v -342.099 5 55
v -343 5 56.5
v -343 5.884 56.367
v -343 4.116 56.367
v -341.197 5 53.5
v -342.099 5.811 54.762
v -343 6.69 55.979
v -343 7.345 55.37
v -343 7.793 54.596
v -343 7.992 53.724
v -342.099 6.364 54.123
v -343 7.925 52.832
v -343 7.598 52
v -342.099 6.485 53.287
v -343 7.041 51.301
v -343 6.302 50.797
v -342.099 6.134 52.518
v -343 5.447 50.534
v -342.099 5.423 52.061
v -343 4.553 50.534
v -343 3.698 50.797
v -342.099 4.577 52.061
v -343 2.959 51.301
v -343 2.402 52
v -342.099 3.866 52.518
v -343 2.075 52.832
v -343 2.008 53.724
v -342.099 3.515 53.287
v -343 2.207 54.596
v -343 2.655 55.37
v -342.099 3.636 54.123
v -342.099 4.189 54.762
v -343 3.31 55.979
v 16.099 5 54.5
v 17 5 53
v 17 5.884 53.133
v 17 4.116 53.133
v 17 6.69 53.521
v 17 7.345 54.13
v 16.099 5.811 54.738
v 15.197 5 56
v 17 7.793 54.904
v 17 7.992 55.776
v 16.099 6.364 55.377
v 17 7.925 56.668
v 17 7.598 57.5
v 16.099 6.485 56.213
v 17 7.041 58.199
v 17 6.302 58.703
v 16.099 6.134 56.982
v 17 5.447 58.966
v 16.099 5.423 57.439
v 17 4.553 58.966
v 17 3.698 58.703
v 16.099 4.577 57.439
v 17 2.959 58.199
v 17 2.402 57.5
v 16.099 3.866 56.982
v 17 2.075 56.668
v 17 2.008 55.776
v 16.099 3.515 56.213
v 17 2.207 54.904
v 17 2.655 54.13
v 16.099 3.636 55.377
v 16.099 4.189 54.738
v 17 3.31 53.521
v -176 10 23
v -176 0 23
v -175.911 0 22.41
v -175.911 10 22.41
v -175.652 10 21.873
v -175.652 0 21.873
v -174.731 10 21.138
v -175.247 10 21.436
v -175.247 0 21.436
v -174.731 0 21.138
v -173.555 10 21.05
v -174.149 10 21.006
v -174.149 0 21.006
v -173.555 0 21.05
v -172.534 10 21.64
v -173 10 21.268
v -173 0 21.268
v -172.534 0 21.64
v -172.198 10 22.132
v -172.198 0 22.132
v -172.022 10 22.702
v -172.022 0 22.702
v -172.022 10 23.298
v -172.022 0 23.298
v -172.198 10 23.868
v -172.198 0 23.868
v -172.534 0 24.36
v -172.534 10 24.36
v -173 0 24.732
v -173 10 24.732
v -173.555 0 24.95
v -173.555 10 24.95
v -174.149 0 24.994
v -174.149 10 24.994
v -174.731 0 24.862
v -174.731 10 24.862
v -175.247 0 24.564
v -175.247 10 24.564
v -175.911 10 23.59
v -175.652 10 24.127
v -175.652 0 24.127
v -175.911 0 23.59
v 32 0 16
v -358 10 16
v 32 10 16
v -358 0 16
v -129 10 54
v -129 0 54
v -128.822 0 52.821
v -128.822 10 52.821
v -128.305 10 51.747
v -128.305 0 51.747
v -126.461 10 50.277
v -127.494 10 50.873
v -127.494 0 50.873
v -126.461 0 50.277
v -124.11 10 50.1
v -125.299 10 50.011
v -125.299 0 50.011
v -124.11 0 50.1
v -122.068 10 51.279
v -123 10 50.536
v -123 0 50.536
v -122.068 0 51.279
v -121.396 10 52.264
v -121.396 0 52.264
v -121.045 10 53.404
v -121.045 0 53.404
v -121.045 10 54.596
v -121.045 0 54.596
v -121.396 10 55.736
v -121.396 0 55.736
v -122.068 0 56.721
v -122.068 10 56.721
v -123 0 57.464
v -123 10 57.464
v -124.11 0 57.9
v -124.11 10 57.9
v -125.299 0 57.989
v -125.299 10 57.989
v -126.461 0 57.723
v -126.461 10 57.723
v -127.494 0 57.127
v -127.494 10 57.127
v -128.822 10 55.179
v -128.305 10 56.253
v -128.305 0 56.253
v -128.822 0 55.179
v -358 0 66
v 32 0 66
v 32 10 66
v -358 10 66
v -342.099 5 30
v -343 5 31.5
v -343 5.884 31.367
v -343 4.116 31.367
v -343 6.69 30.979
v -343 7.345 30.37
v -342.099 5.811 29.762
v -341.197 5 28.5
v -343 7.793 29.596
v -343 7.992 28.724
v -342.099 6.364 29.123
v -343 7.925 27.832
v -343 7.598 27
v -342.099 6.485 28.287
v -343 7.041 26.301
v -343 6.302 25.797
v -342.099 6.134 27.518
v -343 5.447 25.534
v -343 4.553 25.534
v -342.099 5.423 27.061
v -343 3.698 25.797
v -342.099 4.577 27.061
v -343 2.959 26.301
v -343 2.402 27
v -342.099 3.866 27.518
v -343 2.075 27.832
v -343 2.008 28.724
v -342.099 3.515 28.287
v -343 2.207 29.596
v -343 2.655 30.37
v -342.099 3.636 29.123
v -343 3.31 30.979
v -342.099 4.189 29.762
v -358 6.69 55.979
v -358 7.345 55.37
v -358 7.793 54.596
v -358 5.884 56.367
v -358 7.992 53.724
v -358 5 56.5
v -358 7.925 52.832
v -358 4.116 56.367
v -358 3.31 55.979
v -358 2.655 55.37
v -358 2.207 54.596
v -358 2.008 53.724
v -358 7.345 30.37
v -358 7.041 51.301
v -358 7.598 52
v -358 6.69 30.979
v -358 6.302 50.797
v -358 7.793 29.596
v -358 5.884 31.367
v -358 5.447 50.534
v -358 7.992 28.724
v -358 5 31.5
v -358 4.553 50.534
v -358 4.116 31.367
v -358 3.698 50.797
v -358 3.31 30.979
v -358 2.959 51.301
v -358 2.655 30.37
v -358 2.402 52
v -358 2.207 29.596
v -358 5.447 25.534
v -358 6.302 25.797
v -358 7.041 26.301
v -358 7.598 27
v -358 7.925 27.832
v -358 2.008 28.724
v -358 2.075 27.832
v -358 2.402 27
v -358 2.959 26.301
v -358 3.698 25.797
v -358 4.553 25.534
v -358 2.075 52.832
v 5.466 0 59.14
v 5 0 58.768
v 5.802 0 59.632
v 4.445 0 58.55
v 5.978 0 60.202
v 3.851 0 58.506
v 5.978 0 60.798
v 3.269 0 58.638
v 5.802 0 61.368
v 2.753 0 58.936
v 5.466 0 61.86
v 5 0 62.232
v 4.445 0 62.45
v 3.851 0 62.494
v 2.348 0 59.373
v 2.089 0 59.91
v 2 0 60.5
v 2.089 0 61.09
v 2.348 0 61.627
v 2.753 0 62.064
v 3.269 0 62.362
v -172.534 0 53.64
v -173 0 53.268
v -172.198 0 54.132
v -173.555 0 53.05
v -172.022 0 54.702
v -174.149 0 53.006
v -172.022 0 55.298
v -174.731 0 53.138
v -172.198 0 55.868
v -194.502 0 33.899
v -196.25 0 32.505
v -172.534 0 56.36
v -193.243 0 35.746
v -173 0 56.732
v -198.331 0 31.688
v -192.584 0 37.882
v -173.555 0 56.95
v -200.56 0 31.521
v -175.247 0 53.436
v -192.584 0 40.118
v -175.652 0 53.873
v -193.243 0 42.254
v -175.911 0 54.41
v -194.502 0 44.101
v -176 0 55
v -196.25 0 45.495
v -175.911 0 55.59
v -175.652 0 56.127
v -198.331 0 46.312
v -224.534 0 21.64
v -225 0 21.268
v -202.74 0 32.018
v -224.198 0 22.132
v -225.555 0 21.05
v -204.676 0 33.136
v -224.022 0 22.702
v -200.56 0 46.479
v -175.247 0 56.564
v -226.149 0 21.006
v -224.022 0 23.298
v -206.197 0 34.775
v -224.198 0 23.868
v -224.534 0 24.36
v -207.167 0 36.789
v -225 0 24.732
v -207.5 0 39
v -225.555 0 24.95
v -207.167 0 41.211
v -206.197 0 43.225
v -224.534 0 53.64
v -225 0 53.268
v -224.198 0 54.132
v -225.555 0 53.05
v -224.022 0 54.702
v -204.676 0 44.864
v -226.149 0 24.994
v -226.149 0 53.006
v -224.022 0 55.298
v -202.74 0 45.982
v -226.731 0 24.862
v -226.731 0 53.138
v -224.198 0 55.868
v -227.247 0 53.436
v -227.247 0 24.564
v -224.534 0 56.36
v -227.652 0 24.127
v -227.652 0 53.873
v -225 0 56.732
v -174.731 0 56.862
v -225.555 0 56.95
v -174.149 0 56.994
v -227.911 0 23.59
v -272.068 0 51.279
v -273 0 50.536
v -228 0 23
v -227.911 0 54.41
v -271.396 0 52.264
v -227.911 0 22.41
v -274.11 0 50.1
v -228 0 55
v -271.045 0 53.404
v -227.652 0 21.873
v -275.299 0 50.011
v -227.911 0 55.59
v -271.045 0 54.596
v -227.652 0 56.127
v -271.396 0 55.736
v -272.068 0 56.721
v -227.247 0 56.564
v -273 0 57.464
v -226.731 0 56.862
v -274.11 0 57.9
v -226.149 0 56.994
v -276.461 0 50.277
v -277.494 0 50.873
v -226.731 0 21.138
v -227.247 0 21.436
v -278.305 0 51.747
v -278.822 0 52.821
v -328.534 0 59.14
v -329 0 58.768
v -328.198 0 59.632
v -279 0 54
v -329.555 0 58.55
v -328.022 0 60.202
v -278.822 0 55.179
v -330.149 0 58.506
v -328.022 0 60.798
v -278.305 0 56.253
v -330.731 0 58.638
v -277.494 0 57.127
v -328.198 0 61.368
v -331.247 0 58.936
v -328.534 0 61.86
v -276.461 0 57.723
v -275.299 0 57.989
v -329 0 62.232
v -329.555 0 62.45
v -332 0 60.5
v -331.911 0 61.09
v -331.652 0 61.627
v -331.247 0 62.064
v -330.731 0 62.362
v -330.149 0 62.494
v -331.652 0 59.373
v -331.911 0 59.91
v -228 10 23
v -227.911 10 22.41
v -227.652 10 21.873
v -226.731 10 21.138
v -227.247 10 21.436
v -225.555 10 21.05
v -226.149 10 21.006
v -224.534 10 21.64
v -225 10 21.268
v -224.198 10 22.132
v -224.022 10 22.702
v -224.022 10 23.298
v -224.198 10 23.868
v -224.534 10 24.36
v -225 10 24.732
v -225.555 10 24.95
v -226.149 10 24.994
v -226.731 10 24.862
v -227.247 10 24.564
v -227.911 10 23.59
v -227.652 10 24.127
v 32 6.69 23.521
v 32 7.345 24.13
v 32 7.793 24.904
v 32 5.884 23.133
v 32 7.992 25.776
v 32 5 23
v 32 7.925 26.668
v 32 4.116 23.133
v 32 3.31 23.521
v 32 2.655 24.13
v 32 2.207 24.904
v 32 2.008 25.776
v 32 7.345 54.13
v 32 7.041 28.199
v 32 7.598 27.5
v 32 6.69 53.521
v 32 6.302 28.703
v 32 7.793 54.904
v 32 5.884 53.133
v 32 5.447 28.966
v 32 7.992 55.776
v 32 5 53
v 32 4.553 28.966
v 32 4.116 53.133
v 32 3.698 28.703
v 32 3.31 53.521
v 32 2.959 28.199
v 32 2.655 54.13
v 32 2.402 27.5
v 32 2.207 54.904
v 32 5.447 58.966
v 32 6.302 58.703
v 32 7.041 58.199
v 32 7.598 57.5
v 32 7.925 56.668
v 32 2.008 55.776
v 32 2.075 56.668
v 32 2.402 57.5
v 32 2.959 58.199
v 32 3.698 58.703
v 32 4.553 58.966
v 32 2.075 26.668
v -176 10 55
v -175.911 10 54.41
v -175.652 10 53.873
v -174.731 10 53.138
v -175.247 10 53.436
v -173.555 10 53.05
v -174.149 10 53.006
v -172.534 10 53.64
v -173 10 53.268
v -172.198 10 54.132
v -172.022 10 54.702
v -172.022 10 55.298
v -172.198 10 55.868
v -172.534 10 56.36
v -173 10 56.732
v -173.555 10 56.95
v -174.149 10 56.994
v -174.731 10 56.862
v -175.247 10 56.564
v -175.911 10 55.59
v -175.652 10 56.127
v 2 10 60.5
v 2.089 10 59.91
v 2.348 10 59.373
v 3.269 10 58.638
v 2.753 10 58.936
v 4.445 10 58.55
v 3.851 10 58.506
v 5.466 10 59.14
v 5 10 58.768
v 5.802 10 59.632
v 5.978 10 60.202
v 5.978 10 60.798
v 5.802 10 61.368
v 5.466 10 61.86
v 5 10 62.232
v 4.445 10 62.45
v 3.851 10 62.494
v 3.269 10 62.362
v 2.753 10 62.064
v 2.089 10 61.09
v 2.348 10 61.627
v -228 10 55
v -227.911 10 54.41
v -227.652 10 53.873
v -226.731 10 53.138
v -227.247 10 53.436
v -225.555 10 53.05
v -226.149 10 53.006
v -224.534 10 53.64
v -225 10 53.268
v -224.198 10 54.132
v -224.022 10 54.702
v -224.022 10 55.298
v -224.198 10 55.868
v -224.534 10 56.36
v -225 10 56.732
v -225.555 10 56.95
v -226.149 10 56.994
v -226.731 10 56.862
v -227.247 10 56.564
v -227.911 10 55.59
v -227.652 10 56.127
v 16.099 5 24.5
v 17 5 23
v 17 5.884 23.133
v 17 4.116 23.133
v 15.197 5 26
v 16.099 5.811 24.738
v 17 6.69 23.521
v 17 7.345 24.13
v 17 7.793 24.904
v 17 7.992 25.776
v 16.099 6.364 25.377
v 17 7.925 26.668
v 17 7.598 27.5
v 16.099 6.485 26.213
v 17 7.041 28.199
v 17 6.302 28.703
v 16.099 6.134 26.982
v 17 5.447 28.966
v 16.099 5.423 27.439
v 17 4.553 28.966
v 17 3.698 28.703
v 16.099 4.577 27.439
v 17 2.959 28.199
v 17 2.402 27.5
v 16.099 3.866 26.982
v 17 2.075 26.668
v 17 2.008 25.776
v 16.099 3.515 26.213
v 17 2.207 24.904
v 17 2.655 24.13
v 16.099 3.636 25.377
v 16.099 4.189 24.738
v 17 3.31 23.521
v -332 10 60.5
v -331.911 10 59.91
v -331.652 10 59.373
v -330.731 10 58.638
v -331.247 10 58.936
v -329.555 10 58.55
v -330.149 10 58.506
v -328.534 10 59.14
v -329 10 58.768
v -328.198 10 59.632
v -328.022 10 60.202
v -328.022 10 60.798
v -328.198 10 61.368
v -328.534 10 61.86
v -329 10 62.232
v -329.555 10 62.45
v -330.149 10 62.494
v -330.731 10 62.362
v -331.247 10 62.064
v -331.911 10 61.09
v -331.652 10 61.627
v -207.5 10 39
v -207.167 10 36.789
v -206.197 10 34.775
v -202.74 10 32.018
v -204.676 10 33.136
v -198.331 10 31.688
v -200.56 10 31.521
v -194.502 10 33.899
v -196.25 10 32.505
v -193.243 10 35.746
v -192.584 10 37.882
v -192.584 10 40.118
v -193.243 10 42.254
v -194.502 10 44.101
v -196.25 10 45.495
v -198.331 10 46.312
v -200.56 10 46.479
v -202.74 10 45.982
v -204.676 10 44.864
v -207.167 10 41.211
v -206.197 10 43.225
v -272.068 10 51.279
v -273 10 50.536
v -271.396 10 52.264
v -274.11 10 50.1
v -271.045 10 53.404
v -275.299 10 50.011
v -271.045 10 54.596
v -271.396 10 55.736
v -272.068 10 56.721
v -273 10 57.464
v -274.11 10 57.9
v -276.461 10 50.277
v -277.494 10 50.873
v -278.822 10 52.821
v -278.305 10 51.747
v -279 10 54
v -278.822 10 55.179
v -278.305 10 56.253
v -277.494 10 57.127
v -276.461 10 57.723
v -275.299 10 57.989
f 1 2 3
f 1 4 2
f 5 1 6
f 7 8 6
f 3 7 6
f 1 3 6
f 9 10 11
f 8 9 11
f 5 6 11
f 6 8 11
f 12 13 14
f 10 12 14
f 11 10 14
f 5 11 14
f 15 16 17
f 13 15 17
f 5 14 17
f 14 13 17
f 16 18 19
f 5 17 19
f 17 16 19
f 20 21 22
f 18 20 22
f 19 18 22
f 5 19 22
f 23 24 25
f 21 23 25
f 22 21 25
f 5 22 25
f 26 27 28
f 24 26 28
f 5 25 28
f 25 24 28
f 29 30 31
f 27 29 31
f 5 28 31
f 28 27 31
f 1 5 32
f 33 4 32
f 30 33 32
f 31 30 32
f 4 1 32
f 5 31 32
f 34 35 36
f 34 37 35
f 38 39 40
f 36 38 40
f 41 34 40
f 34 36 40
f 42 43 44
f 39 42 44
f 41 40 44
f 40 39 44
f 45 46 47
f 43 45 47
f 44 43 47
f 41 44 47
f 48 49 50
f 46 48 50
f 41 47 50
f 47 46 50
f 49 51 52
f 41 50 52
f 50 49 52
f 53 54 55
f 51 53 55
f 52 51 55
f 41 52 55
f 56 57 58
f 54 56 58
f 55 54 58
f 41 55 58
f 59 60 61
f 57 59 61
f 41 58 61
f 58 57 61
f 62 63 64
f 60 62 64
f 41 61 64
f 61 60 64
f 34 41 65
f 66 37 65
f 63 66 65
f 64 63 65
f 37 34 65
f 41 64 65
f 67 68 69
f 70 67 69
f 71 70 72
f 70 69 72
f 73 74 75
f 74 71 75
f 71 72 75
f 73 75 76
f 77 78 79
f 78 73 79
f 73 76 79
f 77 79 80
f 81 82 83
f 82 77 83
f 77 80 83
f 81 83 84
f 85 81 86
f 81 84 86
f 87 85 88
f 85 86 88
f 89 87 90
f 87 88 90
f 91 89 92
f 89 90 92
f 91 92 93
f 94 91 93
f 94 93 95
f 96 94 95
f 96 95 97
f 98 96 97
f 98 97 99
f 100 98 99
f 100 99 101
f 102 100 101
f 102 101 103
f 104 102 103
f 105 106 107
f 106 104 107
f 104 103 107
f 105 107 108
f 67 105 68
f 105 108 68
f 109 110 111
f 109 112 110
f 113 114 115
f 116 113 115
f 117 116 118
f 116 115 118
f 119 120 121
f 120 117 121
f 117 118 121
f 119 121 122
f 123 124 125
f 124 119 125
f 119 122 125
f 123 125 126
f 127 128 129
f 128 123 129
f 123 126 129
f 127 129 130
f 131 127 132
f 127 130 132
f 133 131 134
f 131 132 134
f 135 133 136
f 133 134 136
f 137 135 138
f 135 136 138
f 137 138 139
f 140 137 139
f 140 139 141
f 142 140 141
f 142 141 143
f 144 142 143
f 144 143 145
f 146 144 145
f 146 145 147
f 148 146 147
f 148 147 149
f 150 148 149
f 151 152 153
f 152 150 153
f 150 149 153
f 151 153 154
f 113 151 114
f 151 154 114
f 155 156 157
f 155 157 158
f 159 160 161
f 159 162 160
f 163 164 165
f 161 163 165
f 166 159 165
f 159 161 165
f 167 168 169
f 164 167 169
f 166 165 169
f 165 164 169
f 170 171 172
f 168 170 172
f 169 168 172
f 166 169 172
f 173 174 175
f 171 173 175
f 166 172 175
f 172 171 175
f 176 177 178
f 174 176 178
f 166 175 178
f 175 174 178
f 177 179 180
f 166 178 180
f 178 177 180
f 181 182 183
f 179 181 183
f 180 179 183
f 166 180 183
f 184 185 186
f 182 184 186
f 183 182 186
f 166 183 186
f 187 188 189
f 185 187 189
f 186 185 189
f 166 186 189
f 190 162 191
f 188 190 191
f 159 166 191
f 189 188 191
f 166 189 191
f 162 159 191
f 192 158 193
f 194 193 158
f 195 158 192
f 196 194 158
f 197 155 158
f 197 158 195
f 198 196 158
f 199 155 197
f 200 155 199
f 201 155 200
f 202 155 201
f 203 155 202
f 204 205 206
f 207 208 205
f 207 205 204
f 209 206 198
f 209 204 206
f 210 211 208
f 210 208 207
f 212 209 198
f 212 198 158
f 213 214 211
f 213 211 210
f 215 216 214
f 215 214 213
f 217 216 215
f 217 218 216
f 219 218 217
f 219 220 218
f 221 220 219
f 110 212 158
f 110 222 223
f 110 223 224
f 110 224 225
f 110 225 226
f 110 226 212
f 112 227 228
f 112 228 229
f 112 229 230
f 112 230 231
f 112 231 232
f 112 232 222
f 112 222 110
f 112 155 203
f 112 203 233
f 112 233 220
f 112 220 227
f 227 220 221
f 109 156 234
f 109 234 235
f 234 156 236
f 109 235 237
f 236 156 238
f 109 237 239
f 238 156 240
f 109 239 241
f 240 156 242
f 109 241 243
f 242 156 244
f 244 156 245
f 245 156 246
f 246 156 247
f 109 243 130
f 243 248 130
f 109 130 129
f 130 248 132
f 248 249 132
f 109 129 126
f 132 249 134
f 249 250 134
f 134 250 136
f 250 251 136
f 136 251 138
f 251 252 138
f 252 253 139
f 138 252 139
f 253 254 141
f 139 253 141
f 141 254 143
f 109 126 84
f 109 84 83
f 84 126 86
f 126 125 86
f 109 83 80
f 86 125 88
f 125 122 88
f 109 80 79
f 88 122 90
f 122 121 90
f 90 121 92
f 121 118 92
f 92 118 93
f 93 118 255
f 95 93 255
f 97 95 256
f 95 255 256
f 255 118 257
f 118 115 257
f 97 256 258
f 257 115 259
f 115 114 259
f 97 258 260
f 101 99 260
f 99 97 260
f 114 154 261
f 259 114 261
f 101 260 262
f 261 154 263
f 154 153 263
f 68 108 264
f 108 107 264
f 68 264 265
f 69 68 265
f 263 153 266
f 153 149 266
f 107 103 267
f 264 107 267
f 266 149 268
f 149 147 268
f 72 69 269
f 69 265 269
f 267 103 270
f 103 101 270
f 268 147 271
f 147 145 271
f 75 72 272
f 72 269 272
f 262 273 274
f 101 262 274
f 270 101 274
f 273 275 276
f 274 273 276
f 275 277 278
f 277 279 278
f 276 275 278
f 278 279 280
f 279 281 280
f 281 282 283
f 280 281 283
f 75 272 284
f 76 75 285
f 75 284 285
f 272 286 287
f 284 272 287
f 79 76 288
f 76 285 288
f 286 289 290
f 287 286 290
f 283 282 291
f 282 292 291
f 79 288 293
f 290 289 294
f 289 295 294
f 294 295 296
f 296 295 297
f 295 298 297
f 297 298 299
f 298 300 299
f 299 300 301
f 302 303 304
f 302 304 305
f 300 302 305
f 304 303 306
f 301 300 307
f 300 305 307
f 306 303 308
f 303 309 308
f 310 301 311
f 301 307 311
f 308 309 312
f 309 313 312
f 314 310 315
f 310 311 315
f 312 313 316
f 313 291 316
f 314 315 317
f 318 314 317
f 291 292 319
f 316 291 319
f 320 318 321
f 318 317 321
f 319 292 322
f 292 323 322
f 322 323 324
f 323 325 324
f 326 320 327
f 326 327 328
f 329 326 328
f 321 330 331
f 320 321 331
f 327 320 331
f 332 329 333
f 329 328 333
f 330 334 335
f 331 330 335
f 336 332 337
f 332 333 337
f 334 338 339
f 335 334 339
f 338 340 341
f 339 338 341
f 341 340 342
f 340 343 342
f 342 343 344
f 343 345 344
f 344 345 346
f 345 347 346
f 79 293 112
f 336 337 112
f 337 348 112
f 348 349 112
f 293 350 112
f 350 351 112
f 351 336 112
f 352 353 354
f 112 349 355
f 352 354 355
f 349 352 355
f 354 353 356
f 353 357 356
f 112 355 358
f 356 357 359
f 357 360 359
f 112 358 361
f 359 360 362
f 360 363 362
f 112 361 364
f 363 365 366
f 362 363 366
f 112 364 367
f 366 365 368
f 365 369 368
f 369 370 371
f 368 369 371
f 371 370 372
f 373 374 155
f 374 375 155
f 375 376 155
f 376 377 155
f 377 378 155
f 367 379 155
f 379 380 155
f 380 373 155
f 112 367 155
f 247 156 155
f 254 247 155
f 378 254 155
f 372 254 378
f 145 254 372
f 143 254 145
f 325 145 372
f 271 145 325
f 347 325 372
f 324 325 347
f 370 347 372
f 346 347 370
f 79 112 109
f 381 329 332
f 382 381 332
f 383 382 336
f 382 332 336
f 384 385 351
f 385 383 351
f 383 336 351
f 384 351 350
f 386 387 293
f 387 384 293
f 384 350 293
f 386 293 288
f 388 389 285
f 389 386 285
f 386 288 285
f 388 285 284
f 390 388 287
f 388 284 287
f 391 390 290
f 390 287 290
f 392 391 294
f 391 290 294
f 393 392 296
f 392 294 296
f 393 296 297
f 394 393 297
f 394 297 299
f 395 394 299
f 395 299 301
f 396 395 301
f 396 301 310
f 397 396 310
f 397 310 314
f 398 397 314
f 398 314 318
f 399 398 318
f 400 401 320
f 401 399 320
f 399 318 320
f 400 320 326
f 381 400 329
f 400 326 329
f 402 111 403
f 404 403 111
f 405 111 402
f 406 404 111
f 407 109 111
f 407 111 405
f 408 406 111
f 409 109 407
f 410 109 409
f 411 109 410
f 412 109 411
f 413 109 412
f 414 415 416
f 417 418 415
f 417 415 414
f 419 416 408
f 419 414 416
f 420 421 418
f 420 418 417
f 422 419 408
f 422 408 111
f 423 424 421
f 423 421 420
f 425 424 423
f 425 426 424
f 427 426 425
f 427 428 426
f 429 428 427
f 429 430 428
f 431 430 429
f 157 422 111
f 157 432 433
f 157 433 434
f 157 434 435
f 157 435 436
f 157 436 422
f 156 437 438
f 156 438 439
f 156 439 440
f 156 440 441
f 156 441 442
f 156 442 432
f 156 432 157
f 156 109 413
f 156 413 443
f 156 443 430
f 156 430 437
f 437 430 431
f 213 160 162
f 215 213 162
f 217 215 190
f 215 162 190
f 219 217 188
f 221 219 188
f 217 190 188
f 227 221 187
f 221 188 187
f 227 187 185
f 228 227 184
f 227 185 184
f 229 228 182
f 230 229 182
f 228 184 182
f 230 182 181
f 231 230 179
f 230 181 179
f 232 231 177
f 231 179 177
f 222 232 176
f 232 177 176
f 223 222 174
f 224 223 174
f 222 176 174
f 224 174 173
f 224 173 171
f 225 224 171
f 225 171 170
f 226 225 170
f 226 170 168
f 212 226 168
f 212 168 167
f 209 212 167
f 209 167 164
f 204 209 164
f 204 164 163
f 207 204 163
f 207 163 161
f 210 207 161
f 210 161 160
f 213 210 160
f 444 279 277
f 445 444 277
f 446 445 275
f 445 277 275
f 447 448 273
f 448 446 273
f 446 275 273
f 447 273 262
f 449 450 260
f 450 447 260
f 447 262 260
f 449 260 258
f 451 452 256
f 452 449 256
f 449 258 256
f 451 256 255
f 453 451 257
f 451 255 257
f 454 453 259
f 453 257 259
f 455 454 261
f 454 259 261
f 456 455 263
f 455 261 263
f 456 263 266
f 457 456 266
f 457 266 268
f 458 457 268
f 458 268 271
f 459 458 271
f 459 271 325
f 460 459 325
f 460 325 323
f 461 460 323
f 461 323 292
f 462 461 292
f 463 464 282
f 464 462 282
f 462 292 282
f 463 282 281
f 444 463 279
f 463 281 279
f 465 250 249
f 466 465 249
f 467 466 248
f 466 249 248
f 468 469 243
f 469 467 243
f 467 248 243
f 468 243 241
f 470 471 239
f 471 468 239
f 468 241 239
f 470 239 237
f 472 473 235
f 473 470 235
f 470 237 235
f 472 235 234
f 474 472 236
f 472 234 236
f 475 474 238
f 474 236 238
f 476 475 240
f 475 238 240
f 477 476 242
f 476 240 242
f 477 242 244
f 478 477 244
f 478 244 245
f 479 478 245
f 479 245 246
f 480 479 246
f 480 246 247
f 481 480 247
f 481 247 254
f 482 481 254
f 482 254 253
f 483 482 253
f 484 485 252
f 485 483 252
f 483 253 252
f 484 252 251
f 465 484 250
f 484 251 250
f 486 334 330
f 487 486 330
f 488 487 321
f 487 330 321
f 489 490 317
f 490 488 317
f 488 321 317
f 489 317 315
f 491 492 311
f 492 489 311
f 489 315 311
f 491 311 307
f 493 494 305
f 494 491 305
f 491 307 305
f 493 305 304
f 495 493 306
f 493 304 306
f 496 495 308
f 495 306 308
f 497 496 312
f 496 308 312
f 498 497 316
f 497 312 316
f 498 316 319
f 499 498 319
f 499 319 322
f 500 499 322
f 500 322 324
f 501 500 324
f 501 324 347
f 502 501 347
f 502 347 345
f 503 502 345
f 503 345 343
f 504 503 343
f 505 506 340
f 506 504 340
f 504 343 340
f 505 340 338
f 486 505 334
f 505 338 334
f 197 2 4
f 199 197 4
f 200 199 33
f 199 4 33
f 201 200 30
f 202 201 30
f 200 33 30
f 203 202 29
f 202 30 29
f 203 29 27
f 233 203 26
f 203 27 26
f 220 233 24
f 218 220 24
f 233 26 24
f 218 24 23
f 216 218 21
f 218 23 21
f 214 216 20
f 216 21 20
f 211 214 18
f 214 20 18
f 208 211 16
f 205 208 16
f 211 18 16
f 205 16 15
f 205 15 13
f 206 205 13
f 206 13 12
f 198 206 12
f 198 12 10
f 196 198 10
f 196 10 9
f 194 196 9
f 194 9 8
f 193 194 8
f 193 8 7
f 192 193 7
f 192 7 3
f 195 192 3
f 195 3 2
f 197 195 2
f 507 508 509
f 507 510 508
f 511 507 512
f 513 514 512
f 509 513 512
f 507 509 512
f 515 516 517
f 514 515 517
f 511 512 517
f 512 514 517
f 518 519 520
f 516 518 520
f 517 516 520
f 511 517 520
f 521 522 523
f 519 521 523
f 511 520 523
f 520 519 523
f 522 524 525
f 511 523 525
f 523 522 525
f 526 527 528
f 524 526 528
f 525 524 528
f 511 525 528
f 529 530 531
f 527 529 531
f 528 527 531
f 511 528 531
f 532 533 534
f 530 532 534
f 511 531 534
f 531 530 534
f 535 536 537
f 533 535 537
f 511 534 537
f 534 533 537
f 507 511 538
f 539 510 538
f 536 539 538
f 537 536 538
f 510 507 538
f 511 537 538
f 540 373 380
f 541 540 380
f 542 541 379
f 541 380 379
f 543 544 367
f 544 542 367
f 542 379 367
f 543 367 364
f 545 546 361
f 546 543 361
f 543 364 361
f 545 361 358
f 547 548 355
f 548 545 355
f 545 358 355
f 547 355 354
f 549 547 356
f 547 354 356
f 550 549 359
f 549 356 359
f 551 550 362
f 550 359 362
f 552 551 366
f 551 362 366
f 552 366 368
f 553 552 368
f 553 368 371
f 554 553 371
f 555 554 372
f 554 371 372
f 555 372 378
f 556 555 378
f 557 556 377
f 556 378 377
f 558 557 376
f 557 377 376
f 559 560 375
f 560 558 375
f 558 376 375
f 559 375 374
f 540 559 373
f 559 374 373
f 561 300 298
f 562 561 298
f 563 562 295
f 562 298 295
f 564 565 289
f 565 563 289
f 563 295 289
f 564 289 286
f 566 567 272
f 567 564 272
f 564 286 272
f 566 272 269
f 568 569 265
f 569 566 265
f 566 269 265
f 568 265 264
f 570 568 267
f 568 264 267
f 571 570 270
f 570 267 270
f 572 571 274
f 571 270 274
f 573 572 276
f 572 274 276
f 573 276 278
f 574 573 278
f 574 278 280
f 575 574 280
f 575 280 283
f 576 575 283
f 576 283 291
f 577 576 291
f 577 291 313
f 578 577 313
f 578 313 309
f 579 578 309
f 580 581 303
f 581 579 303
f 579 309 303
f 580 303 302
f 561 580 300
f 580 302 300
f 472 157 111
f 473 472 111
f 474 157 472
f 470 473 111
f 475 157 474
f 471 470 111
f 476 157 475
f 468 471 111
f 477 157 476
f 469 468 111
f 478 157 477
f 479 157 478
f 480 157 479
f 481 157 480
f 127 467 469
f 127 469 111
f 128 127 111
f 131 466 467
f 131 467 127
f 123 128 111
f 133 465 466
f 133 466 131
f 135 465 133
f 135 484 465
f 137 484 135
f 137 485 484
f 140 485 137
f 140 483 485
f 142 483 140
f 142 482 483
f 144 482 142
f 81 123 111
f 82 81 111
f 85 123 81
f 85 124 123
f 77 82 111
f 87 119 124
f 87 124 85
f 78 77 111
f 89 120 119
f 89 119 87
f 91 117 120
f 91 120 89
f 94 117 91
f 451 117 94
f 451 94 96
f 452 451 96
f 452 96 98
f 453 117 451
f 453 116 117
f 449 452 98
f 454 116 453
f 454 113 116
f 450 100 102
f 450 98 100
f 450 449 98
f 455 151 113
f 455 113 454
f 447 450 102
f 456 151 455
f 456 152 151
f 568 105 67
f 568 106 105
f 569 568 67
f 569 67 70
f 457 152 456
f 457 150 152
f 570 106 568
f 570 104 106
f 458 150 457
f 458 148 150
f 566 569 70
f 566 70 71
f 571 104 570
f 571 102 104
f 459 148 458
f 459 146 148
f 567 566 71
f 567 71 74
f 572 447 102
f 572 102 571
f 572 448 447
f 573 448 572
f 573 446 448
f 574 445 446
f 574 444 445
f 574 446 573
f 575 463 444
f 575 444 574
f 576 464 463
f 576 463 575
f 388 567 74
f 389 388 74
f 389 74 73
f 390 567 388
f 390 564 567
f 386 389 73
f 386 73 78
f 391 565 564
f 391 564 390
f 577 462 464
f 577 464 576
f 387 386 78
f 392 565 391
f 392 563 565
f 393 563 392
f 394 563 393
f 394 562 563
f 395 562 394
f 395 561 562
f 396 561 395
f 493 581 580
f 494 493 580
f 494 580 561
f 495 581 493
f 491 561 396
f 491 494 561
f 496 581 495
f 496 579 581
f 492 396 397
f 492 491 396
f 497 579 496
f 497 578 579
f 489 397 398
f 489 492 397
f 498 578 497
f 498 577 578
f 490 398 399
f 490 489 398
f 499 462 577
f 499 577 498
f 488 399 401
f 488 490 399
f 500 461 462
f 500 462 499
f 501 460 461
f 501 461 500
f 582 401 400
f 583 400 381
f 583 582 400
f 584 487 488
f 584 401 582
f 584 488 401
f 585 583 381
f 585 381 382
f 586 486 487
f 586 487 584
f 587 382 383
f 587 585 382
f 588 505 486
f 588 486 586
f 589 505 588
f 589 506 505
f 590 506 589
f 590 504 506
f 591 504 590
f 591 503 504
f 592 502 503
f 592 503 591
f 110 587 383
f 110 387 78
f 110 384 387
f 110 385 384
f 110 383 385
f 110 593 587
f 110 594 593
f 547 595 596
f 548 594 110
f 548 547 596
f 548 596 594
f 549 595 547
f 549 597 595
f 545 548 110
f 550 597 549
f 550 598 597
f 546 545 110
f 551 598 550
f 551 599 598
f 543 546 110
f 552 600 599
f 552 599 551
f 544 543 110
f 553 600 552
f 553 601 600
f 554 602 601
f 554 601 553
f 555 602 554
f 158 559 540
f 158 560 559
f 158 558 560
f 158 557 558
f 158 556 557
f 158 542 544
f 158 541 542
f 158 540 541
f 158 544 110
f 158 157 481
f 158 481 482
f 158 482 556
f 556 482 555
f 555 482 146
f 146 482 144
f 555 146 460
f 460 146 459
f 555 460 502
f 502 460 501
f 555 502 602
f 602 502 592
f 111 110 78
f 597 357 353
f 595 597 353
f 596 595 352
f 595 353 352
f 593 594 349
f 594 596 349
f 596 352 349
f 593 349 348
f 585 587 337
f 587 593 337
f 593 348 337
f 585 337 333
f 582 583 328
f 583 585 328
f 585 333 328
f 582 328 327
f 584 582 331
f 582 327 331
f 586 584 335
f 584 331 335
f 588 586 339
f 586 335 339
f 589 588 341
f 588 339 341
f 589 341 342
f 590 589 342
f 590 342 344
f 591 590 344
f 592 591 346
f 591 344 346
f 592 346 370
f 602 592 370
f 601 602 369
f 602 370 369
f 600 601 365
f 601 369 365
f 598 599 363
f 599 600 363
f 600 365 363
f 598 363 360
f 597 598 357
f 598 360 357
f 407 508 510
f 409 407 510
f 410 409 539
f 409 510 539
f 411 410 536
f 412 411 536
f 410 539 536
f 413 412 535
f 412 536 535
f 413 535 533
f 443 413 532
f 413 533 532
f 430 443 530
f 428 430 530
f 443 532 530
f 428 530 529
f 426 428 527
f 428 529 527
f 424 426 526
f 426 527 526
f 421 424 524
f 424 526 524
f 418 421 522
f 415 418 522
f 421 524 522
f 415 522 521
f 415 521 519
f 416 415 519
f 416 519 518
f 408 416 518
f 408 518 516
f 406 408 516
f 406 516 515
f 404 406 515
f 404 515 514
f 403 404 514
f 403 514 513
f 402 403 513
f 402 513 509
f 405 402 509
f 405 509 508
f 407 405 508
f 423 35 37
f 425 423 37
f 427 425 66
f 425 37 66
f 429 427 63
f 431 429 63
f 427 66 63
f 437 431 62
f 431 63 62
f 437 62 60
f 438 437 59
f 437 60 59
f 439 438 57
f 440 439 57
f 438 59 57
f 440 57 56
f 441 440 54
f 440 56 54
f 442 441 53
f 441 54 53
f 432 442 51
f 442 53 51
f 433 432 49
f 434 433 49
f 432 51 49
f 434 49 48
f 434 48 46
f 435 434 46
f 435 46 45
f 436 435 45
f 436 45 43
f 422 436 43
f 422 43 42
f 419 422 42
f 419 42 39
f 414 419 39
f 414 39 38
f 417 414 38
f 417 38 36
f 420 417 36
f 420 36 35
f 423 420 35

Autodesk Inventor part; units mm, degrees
ref_plane "YZ Plane" through (0, 0, 0) normal (1, 0, 0) x (0, 1, 0)
ref_plane "XZ Plane" through (0, 0, 0) normal (0, 1, 0) x (-1, 0, 0)
ref_plane "XY Plane" through (0, 0, 0) normal (0, 0, 1) x (1, 0, 0)
sketch "Boceto1" plane through (0, 0, 0) normal (0, 1, 0) x (-1, 0, 0)
  line L0 (-32, 16) -> (-32, 66)
  line L1 (-32, 66) -> (358, 66)
  line L2 (358, 66) -> (358, 16)
  line L3 (358, 16) -> (-32, 16)
  circle A0 centre (200, 39) radius 7.5
  circle A1 centre (275, 54) radius 4
  circle A2 centre (125, 54) radius 4
  line L4 (179, 60) -> (179, 18)
  line L5 (179, 18) -> (221, 18)
  line L6 (221, 18) -> (221, 60)
  line L7 (221, 60) -> (179, 60)
  circle A3 centre (184.5, 54.5) radius 2
  circle A4 centre (215.5, 54.5) radius 2
  circle A5 centre (215.5, 23.5) radius 2
  circle A6 centre (184.5, 23.5) radius 2
  circle A7 centre (174, 55) radius 2
  line L8 (169, 60) -> (179, 60)
  line L9 (200, 39) -> (195, 39)
  line L10 (195, 39) -> (200, 39)
  line L11 (200, 60) -> (200, 61)
  circle A8 centre (226, 55) radius 2
  line L12 (231, 60) -> (221, 60)
  circle A9 centre (174, 23) radius 2
  line L13 (169, 18) -> (179, 18)
  circle A10 centre (226, 23) radius 2
  line L14 (231, 18) -> (221, 18)
  circle A11 centre (330, 60.5) radius 2
  circle A12 centre (-4, 60.5) radius 2
  point P0 (0, 0)
  dimension "d0" = 50
  dimension "d1" = 390
  dimension "d2" = 15
  dimension "d4" = 8
  dimension "d5" = 8
  dimension "d6" = 15
  dimension "d7" = 75
  dimension "d8" = 75
  dimension "d91" = 4
  dimension "d92" = 4
  dimension "d93" = 4
  dimension "d94" = 4
  dimension "d95" = 31
  dimension "d96" = 31
  dimension "d97" = 31
  dimension "d98" = 31
  dimension "d99" = 5.5
  dimension "d100" = 5.5
  dimension "d101" = 5.5
  dimension "d102" = 5.5
  dimension "d103" = 5.5
  dimension "d104" = 5.5
  dimension "d106" = 4
  dimension "d112" = 5
  dimension "d113" = 5
  dimension "d115" = 42
  dimension "d116" = 12
  dimension "d117" = 12
  dimension "d142" = 4
  dimension "d143" = 4
  dimension "d144" = 5.5
  dimension "d145" = 157
  dimension "d146" = 28
  dimension "d147" = 5.5
  dimension "d148" = 28
extrude "Extrusión1" add sketch "Boceto1" along normal blind 10 contours L0 L1 L2 L3 | L7 L6 L5 L4 | A3 | A4 | A5 | A6
sketch "Boceto6" plane through (32, 0, 66) normal (1, 0, 0) x (0, 0, -1)
  line L0 (0, 0) -> (0, 10) projected
  line L1 (0, 5) -> (50, 5)
  line L2 (50, 0) -> (50, 10) projected
  line L3 (50, 5) -> (40, 5)
  line L4 (0, 5) -> (10, 5)
  circle A0 centre (10, 5) radius 3
  circle A1 centre (40, 5) radius 3
  point P0 (66, 0)
  dimension "d35" = 10
  dimension "d36" = 6
  dimension "d37" = 6
  dimension "d119" = 10
hole "Agujero1" at (32, 5, 56) at (32, 5, 26) direction (-1, 0, 0) diameter 6 depth 15 tip angle 118
sketch "Boceto8" plane through (-358, 0, 16) normal (-1, 0, 0) x (0, 0, 1)
  line L0 (50, 0) -> (50, 10) projected
  line L1 (50, 5) -> (37.5, 5)
  line L2 (37.5, 5) -> (12.5, 5)
  circle A0 centre (40, 5) radius 3 projected
  circle A1 centre (40, 5) radius 3
  circle A2 centre (12.5, 5) radius 3
  point P0 (-16, 0)
  dimension "d58" = 12.5
  dimension "d59" = 25
  dimension "d60" = 6
  dimension "d61" = 6
hole "Agujero3" at (-358, 5, 53.5) at (-358, 5, 28.5) direction (1, 0, 0) diameter 6 depth 15 tip angle 118
thread "Rosca1" size "M6x1" class "6H" standard "ISO Metric profile" length 430
thread "Rosca2" size "M6x1" class "6H" standard "ISO Metric profile" length 430
thread "Rosca3" size "M6x1" class "6H" standard "ISO Metric profile" length 430
thread "Rosca4" size "M6x1" class "6H" standard "ISO Metric profile" length 430
thread "Rosca5" size "M4x0.7" class "6H" standard "ISO Metric profile" length 22
thread "Rosca6" size "M4x0.7" class "6H" standard "ISO Metric profile" length 22
thread "Rosca7" size "M4x0.7" class "6H" standard "ISO Metric profile" length 22
thread "Rosca8" size "M4x0.7" class "6H" standard "ISO Metric profile" length 922
thread "Rosca9" size "M4x0.7" class "6H" standard "ISO Metric profile" length 100
thread "Rosca10" size "M4x0.7" class "6H" standard "ISO Metric profile" length 100
equation "\"d35\" = d119"
properties part number "Culata" material "Aluminio 6061"
